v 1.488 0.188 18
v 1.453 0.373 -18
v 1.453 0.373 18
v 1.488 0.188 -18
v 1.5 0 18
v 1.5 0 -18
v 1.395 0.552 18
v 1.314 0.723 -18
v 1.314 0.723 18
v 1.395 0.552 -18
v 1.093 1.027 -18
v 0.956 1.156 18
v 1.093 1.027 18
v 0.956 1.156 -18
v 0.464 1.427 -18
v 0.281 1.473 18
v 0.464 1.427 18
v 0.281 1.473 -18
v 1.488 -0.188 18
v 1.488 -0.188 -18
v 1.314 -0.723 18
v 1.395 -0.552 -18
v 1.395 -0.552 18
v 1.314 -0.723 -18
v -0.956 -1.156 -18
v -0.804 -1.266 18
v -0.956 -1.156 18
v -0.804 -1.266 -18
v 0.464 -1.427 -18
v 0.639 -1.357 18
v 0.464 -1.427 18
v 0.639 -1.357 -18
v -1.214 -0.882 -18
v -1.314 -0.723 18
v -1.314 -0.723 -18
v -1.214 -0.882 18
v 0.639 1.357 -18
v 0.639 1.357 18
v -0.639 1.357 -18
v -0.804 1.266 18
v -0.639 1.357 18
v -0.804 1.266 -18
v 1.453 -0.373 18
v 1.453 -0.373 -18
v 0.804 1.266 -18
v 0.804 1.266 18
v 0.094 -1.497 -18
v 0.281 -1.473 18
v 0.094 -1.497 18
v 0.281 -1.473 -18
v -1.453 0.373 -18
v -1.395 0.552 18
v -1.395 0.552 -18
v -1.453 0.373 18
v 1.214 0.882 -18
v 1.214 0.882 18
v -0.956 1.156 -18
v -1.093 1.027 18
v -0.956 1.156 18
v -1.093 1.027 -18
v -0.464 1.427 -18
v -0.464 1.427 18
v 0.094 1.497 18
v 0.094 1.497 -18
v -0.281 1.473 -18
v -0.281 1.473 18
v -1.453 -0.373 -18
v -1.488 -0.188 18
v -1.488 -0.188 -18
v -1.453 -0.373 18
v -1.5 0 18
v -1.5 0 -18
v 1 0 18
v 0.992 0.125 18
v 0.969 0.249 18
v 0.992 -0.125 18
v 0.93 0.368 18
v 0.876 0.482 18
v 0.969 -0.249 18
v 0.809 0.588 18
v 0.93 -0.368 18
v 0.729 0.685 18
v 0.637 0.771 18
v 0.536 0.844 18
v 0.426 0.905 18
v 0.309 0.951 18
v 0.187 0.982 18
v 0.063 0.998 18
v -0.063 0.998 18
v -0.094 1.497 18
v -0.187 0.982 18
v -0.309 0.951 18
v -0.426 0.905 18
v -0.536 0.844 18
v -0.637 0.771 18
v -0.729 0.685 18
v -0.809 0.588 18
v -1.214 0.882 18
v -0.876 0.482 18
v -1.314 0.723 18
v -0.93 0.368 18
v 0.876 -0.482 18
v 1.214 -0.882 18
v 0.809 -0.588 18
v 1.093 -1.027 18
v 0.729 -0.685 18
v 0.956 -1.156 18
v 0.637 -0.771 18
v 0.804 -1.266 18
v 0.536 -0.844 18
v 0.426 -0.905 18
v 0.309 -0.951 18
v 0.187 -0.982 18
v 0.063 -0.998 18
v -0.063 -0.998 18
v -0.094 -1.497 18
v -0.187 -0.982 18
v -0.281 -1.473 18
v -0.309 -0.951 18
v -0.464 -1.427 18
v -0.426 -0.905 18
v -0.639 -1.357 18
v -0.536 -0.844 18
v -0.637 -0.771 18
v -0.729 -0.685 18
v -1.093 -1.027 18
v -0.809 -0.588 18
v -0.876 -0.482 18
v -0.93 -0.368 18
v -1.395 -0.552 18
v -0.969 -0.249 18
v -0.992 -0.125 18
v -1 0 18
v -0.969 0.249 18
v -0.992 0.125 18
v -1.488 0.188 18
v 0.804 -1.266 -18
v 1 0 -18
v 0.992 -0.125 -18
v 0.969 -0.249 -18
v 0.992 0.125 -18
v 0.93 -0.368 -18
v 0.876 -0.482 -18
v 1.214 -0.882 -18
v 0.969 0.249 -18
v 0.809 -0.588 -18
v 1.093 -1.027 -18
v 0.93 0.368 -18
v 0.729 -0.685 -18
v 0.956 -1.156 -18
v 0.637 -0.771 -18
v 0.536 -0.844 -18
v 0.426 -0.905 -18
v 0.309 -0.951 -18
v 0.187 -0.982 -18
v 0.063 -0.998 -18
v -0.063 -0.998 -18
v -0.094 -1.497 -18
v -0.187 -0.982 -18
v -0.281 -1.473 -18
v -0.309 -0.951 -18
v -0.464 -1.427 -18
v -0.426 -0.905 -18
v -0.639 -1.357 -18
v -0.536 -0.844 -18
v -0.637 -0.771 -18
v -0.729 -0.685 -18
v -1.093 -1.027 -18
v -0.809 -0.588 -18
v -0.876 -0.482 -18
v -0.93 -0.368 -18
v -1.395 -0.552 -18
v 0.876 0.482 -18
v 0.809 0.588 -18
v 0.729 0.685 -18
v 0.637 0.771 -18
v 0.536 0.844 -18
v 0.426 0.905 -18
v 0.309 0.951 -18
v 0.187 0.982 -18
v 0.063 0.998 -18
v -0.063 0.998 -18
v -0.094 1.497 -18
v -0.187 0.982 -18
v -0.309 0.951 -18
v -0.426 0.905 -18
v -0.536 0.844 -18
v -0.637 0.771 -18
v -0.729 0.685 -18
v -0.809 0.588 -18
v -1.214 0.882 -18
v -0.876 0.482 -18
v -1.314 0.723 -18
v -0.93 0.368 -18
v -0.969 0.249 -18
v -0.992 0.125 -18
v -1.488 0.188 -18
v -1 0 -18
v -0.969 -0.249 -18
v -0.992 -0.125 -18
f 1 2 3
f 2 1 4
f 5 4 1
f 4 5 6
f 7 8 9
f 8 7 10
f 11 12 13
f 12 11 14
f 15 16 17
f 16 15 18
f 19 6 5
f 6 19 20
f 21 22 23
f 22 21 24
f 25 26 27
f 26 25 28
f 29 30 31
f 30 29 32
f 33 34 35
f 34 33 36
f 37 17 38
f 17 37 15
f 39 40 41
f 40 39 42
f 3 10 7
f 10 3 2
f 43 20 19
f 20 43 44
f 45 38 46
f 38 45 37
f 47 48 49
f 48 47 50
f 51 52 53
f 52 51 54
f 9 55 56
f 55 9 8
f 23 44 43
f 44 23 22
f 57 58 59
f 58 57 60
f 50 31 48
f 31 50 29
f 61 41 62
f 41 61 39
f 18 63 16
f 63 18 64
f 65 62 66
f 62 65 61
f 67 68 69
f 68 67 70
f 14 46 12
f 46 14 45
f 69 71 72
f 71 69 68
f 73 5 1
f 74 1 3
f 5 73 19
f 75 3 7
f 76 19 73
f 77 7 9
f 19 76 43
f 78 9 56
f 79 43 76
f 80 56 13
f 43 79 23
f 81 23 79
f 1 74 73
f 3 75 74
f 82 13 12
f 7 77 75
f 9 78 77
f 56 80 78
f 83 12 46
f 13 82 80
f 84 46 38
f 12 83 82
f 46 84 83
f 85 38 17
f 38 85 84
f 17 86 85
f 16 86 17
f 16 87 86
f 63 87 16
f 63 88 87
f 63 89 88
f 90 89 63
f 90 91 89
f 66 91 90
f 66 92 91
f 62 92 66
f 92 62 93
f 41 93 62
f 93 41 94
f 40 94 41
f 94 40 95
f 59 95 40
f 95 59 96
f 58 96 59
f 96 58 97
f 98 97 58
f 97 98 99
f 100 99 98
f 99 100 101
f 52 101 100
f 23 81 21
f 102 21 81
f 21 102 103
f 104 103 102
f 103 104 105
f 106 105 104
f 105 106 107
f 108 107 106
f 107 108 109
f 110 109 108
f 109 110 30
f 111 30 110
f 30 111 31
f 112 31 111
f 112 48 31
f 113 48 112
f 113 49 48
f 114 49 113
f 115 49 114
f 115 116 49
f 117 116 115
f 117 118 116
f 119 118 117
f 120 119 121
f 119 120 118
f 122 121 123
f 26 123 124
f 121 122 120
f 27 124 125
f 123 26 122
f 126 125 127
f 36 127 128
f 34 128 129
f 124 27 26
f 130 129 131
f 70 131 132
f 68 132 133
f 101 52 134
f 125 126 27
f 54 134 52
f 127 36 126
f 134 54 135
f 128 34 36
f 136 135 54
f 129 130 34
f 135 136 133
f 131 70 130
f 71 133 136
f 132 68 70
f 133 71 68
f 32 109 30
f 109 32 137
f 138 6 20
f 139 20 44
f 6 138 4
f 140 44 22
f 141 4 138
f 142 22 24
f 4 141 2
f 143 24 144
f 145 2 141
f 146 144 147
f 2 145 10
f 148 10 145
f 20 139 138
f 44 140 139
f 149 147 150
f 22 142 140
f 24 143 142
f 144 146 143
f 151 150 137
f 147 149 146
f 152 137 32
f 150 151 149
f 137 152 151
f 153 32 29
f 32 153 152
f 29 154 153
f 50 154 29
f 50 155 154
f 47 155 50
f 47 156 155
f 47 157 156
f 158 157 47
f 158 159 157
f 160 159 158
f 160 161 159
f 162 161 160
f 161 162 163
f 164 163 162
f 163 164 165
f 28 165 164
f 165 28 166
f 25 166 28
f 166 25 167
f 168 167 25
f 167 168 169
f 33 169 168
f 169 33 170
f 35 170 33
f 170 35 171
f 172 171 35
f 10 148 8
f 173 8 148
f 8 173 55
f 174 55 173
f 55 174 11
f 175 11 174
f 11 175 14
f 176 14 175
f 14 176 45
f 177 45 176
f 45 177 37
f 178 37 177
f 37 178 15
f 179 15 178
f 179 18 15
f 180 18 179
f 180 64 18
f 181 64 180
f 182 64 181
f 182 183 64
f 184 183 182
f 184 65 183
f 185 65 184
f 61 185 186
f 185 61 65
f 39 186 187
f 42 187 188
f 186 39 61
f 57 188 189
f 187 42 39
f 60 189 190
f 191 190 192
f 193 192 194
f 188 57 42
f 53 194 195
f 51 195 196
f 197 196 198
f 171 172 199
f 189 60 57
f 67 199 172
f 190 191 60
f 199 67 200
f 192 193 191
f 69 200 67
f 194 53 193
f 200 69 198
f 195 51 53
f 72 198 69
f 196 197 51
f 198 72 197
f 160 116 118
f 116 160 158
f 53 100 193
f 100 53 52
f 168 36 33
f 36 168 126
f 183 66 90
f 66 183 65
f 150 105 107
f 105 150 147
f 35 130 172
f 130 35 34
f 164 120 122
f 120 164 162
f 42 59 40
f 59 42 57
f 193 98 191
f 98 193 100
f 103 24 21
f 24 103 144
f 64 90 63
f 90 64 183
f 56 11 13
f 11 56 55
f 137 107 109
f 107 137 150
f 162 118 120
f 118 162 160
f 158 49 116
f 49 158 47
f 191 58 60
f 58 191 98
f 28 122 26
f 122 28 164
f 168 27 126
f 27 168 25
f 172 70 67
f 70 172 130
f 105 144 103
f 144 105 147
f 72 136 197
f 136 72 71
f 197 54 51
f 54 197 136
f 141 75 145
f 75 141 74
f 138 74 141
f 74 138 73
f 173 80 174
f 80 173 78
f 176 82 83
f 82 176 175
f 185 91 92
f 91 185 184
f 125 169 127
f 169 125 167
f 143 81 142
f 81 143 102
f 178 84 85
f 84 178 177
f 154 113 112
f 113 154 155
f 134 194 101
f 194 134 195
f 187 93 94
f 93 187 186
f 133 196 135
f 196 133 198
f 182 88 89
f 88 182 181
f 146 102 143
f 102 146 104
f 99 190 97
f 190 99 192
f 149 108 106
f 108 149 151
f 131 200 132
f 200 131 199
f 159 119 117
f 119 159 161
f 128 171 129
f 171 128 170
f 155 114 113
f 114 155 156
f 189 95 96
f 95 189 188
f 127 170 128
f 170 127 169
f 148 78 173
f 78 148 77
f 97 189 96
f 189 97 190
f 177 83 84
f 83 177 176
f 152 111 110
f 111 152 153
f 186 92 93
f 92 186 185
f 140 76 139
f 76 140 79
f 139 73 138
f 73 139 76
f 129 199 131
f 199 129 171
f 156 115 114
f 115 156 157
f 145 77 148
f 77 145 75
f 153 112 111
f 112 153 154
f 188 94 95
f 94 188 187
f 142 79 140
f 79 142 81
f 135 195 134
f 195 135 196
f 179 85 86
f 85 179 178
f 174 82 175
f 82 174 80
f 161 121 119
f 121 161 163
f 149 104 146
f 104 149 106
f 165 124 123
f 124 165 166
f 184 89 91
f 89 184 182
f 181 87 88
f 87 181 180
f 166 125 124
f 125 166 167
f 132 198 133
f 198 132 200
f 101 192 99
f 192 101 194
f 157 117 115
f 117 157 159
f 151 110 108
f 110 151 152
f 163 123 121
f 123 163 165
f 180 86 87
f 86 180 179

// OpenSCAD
$fn = 50;


difference() {
	union() {
		translate(v = [0, 0, -18.0000000000]) {
			cylinder(h = 36, r = 1.5000000000);
		}
	}
	union() {
		translate(v = [0, 0, -100.0000000000]) {
			cylinder(h = 200, r = 1.0000000000);
		}
	}
}
